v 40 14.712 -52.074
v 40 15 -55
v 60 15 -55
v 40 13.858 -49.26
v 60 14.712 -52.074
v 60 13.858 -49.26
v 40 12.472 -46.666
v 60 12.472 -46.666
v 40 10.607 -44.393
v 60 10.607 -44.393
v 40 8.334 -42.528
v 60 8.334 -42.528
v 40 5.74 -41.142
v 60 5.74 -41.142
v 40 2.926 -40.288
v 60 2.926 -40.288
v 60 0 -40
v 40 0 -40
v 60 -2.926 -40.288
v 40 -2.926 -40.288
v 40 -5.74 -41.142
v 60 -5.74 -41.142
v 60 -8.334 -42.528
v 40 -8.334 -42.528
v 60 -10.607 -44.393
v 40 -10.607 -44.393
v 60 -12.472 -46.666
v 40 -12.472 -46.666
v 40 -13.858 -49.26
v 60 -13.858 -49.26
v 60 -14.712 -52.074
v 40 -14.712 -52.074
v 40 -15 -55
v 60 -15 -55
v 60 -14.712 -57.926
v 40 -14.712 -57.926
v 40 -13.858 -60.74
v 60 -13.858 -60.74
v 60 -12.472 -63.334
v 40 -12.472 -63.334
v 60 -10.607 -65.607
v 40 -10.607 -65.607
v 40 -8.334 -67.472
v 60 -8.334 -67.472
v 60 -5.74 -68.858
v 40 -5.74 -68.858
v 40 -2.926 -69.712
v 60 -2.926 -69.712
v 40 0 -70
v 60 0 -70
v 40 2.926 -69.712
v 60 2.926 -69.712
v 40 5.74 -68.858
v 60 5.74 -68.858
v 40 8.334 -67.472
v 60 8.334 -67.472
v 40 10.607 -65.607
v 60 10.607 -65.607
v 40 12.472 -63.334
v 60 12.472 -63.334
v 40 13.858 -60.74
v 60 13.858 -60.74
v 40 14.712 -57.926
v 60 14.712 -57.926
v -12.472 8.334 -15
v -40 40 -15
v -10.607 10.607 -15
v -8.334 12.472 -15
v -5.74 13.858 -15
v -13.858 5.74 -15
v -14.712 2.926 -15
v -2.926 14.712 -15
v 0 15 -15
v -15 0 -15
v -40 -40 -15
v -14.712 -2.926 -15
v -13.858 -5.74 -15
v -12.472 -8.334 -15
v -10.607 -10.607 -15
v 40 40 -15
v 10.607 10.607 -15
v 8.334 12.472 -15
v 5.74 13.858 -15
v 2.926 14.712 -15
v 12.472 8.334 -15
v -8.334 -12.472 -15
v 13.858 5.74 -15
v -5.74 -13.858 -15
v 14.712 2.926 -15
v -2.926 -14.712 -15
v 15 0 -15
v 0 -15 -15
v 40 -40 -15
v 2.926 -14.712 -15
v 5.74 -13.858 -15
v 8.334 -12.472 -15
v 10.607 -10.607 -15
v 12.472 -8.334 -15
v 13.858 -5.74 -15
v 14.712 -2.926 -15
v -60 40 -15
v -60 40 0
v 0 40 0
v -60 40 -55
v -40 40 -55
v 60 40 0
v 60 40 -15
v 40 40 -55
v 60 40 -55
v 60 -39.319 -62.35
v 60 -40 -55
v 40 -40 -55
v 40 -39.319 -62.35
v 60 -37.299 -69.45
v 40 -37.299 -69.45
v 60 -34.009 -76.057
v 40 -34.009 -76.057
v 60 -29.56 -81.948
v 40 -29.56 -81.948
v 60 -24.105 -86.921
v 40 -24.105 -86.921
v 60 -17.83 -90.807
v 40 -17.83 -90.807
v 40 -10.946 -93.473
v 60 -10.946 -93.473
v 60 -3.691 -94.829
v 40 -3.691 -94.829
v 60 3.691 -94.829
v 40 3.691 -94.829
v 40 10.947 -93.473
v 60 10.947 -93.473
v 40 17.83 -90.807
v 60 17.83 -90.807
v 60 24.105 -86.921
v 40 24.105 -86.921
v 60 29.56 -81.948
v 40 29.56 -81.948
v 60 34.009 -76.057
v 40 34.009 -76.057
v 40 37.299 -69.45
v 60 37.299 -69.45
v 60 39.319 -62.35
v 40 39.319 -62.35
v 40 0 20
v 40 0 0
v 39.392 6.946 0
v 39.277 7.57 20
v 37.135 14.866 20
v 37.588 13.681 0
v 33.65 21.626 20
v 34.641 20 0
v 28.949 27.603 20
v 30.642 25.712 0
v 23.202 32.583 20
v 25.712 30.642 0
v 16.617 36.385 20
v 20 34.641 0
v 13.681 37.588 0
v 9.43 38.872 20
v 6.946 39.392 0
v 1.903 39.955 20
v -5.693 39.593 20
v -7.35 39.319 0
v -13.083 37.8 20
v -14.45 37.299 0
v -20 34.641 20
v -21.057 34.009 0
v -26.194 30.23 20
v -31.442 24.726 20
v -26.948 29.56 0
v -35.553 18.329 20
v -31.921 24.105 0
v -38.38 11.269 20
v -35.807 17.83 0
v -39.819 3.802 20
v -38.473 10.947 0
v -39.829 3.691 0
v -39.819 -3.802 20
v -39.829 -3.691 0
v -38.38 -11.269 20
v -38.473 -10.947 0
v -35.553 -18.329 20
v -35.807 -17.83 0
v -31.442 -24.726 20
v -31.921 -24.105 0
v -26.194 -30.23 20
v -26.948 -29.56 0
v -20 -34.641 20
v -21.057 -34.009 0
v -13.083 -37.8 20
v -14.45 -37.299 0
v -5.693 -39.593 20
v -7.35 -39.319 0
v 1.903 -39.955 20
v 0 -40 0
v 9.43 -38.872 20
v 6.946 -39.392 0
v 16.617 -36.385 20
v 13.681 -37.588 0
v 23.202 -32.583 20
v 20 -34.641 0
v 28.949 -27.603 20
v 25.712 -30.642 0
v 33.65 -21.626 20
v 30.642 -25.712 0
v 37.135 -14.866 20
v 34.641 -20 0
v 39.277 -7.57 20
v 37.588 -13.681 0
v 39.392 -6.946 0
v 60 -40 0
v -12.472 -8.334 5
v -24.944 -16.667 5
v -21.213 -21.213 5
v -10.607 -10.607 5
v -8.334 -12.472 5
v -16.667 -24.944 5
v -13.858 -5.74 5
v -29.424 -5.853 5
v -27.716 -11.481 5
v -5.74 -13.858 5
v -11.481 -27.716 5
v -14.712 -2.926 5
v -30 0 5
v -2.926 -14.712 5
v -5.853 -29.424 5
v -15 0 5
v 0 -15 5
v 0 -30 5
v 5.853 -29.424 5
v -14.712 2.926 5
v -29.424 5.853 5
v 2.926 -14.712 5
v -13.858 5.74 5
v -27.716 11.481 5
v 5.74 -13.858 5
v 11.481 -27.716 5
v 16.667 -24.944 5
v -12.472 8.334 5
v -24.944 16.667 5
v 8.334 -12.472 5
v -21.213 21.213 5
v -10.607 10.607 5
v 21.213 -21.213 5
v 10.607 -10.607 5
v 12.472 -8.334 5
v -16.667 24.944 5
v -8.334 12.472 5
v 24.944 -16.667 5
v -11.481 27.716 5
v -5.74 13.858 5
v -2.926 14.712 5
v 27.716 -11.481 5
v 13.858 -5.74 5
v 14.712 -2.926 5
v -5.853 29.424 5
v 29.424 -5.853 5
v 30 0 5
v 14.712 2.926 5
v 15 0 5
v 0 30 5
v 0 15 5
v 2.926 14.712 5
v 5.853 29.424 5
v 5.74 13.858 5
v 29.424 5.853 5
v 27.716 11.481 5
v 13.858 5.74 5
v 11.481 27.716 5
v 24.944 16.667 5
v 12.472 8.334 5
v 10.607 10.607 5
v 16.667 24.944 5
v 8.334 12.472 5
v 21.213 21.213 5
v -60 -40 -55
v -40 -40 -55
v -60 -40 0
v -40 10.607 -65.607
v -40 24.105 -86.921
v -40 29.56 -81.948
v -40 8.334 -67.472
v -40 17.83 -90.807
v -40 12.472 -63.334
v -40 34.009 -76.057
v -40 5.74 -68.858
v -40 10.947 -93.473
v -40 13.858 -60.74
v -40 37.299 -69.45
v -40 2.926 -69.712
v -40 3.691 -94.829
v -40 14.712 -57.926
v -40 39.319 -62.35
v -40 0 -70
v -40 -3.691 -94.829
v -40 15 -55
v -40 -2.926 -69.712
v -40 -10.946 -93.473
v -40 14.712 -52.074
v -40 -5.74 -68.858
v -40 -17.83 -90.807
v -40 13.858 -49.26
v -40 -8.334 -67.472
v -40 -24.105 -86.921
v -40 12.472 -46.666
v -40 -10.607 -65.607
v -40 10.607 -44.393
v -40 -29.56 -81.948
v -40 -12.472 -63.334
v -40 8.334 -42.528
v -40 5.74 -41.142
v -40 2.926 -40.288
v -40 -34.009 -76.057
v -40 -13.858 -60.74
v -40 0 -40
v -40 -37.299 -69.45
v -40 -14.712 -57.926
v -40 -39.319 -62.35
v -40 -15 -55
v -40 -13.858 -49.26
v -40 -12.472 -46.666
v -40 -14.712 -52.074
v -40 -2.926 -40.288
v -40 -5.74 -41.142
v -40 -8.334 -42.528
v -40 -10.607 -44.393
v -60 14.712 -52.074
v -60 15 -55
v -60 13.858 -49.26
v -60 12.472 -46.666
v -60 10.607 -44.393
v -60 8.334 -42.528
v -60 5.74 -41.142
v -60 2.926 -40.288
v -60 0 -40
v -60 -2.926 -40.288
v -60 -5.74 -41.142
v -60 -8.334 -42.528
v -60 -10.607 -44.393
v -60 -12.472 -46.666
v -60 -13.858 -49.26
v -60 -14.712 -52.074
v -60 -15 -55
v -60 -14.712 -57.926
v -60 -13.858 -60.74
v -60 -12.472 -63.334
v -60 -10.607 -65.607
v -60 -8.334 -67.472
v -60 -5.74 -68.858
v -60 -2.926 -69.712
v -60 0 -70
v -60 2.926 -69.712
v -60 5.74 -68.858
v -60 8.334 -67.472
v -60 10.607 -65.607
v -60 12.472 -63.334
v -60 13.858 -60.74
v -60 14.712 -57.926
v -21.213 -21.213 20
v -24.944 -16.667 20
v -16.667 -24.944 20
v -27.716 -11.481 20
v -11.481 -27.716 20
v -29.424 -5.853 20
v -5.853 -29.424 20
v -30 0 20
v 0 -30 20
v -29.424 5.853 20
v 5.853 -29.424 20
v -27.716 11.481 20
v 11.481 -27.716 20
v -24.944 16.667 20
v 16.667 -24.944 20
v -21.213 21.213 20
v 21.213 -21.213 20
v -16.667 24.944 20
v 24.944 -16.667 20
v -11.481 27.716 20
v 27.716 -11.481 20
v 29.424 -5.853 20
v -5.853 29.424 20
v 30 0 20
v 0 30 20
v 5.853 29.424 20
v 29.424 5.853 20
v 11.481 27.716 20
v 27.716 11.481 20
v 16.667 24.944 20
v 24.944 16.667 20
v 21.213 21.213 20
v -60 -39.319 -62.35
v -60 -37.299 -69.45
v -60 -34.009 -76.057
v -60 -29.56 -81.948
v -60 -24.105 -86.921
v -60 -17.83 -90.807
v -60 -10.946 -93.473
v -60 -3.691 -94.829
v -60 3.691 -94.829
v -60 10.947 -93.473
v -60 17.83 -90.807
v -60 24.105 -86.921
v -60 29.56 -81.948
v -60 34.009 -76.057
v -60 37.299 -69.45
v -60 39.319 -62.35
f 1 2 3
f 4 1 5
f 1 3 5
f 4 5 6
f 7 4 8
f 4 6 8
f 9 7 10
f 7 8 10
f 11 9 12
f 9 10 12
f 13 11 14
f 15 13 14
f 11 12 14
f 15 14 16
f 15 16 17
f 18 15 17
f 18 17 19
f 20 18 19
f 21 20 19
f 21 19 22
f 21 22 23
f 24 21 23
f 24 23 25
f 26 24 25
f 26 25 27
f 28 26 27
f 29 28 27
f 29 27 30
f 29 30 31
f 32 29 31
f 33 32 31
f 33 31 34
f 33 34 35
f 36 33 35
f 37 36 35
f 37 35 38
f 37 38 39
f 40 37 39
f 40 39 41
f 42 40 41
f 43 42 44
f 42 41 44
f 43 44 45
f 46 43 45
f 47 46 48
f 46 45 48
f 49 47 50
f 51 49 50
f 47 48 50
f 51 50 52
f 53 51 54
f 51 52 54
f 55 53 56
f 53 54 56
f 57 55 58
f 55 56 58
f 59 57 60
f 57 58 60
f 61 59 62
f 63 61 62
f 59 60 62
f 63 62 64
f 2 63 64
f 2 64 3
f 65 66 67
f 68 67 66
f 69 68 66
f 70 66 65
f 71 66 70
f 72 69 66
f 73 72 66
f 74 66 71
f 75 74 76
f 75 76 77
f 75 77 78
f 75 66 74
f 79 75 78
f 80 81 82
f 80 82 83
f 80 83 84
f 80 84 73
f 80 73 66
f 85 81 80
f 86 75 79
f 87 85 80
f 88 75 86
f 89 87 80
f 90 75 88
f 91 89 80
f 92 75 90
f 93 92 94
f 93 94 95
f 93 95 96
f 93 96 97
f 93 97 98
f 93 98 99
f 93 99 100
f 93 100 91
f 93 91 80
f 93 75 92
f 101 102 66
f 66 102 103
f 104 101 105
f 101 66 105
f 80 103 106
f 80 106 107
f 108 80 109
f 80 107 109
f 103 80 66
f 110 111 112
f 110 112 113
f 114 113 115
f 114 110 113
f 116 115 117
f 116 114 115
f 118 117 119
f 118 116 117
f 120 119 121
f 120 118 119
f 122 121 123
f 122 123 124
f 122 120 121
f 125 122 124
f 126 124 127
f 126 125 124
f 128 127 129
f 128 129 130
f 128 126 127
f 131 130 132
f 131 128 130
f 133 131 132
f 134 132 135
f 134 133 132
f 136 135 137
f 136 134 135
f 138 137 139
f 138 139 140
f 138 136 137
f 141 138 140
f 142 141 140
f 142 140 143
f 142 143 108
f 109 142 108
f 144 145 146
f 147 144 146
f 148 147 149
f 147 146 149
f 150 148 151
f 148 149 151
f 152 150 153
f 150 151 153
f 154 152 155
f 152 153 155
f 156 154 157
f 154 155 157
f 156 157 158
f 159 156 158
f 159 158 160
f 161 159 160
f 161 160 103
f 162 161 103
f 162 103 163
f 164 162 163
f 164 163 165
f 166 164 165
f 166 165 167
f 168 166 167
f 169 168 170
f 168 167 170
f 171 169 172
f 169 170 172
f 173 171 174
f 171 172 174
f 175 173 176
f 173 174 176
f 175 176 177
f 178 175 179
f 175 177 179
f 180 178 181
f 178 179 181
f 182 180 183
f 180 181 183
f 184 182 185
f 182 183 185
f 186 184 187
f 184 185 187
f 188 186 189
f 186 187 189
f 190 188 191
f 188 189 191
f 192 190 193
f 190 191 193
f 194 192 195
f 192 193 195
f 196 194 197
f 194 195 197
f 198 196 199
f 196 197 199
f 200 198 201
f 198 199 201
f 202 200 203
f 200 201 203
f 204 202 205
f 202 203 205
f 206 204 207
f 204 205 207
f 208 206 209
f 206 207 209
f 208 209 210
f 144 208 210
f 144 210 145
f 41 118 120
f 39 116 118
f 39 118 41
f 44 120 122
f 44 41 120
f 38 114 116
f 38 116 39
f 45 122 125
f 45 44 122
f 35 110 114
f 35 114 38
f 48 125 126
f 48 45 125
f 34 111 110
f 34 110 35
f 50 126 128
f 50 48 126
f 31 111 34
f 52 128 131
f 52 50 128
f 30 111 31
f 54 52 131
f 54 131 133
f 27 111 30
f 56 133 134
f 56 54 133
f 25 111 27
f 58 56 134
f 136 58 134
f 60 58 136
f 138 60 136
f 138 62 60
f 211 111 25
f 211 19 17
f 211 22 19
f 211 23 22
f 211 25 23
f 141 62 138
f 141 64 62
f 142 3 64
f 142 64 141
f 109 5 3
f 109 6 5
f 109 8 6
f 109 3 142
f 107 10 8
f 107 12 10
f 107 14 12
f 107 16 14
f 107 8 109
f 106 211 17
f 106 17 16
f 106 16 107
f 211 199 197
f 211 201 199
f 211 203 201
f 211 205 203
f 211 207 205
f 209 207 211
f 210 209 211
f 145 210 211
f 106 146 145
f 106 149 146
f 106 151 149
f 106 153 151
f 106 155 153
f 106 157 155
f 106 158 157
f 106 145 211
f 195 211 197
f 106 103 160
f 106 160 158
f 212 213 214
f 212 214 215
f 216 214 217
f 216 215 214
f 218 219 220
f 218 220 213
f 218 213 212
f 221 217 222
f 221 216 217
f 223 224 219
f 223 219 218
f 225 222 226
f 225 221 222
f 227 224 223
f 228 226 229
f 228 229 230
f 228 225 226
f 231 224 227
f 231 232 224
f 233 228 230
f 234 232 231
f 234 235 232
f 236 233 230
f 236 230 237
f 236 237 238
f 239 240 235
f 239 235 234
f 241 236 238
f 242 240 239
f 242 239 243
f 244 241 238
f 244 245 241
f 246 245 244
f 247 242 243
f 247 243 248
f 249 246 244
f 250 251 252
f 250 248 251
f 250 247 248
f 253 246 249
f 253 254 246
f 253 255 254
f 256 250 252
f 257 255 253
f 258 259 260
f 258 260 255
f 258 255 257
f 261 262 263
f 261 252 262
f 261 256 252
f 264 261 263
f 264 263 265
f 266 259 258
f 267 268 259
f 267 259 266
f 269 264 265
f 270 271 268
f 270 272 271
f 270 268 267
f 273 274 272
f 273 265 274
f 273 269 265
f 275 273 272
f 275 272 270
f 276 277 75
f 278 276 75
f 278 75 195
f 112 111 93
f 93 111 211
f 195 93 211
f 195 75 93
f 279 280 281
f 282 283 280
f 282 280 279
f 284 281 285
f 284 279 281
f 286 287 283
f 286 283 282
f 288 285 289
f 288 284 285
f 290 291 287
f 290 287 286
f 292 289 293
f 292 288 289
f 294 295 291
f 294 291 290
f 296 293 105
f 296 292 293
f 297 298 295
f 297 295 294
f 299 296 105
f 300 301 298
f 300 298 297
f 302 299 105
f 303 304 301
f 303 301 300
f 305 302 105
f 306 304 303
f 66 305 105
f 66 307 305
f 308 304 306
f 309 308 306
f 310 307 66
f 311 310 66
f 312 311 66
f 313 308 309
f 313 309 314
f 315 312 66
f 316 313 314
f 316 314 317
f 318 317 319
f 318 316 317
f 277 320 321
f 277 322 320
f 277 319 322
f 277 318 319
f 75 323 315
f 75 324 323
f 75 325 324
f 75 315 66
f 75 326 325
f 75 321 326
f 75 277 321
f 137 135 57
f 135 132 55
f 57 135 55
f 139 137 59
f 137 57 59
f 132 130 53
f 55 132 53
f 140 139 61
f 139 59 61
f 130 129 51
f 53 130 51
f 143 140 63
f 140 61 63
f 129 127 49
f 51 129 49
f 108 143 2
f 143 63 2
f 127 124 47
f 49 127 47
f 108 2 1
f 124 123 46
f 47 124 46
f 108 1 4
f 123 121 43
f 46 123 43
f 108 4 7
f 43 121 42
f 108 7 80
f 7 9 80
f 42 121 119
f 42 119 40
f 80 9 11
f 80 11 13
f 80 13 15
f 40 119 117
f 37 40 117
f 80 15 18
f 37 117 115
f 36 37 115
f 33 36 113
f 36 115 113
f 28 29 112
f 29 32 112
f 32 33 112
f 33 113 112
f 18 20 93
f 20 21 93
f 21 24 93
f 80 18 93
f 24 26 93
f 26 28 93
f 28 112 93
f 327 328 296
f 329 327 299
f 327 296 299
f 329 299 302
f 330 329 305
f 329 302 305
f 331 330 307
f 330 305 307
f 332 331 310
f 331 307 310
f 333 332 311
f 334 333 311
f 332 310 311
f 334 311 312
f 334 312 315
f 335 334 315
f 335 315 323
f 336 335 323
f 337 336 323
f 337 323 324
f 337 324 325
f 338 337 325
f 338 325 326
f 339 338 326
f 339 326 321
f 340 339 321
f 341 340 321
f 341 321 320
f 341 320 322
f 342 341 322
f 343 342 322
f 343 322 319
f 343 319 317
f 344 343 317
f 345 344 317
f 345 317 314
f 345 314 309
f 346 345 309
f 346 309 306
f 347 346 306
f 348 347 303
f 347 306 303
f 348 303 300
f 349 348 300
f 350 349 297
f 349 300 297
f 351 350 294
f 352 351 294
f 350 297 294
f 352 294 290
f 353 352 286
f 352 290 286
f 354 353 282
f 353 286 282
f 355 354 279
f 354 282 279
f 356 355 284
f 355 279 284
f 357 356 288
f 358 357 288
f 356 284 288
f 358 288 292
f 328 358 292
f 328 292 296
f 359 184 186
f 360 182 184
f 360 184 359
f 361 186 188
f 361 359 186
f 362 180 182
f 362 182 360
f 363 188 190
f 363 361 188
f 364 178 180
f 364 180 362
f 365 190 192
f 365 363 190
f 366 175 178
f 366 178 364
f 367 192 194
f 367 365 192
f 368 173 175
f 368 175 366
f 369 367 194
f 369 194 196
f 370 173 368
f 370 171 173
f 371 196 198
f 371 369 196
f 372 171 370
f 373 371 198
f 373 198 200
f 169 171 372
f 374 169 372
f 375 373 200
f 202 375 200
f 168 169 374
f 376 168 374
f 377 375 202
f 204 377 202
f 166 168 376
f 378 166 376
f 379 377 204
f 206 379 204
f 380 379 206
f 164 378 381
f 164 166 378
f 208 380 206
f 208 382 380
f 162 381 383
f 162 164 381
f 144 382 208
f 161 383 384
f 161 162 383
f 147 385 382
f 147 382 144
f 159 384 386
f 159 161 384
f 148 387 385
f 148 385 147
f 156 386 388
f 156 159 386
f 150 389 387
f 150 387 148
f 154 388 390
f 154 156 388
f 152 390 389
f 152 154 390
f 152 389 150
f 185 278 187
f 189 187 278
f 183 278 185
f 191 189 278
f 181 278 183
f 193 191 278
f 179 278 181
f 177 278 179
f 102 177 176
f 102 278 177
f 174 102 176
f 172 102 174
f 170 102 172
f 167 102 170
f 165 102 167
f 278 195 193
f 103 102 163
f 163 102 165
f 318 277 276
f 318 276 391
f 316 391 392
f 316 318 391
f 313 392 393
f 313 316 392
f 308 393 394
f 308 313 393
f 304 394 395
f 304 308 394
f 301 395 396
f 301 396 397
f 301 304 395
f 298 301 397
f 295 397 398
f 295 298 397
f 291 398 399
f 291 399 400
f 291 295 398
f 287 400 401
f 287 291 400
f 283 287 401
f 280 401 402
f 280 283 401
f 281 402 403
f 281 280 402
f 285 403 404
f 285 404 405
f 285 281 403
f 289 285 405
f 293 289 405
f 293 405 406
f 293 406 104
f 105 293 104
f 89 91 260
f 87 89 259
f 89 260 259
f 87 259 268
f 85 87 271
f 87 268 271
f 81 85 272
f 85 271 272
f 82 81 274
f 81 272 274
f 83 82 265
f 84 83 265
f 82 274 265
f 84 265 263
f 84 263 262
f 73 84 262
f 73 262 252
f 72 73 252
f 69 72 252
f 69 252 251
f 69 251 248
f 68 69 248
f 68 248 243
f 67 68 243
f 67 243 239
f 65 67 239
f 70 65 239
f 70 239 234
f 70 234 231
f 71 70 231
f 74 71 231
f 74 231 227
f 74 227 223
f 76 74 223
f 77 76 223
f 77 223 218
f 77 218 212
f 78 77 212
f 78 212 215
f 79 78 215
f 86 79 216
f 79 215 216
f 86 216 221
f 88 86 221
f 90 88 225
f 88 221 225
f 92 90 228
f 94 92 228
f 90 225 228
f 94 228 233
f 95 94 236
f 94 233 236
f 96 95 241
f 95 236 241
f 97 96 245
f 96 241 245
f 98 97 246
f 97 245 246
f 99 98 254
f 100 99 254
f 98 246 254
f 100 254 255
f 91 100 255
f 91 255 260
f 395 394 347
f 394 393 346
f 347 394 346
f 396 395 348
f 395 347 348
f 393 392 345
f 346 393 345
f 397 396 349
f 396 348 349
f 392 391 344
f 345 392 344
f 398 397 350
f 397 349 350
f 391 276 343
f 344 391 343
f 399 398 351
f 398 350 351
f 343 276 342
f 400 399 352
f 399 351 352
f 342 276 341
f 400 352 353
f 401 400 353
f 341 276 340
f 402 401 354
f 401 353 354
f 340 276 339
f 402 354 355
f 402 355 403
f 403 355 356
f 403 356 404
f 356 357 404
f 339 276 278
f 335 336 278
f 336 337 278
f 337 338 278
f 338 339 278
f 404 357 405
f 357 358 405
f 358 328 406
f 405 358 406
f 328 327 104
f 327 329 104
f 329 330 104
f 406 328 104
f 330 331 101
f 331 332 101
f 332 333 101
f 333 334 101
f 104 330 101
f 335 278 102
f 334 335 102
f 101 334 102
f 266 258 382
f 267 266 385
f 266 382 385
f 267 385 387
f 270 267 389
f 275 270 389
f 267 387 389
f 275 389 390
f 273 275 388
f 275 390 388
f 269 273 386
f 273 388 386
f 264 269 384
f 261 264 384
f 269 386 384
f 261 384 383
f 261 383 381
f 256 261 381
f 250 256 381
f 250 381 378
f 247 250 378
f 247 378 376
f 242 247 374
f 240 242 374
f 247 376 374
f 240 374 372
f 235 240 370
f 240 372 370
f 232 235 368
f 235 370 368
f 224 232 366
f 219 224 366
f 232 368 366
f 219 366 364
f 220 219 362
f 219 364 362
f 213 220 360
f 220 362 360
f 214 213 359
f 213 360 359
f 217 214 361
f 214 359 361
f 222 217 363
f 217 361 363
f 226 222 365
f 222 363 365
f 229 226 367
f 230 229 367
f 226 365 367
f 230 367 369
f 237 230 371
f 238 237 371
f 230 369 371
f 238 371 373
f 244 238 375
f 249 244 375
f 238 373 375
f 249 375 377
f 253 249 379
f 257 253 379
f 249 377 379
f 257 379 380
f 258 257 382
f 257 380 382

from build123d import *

# Parameters (mm, degrees)
SKETCH_W        = 120
SKETCH_H        = 80
PAD_DEPTH       = 15
SKETCH001_R     = 40
PAD001_DEPTH    = 20
SKETCH002_R     = 30
POCKET_DEPTH    = 15
SKETCH003_R     = 15
POCKET001_DEPTH = 20.001
SKETCH004_R     = 15
PAD002_DEPTH    = 120
SKETCH005_W     = 80
SKETCH005_H     = 96.232483
POCKET002_DEPTH = 80.0010000001


with BuildPart() as part:
    # Sketch → Pad (new body)
    with BuildSketch(Plane.XY):
        Rectangle(SKETCH_W, SKETCH_H)
    extrude(amount=-PAD_DEPTH)

    # Sketch001 → Pad001 (new body)
    with BuildSketch(Plane.XY):
        Circle(SKETCH001_R)
    extrude(amount=PAD001_DEPTH)

    # Sketch002 → Pocket (cut)
    with BuildSketch(Plane.XY.offset(20)):
        Circle(SKETCH002_R)
    extrude(amount=-POCKET_DEPTH, mode=Mode.SUBTRACT)

    # Sketch003 → Pocket001 (cut, through all)
    with BuildSketch(Plane.XY.offset(5)):
        Circle(SKETCH003_R)
    extrude(amount=-POCKET001_DEPTH, mode=Mode.SUBTRACT)

    # Sketch004 → Pad002 (new body)
    with BuildSketch(Plane.YZ.offset(60)):
        with BuildLine():
            ThreePointArc((-40, -55), (3.45478e-05, -95), (39.9999999999, -54.9999309045))
            Line((39.9999999999, -15), (39.9999999999, -54.9999309045))
            Line((-40, -15), (39.9999999999, -15))
            Line((-40, -55), (-40, -15))
        make_face()
        with Locations((0, -55)):
            Circle(SKETCH004_R, mode=Mode.SUBTRACT)
    extrude(amount=-PAD002_DEPTH)

    # Sketch005 → Pocket002 (cut, through all)
    with BuildSketch(Plane.XZ.offset(40)):
        with Locations((0, -63.1162415)):
            Rectangle(SKETCH005_W, SKETCH005_H)
    extrude(amount=-POCKET002_DEPTH, mode=Mode.SUBTRACT)


solid = part.part
